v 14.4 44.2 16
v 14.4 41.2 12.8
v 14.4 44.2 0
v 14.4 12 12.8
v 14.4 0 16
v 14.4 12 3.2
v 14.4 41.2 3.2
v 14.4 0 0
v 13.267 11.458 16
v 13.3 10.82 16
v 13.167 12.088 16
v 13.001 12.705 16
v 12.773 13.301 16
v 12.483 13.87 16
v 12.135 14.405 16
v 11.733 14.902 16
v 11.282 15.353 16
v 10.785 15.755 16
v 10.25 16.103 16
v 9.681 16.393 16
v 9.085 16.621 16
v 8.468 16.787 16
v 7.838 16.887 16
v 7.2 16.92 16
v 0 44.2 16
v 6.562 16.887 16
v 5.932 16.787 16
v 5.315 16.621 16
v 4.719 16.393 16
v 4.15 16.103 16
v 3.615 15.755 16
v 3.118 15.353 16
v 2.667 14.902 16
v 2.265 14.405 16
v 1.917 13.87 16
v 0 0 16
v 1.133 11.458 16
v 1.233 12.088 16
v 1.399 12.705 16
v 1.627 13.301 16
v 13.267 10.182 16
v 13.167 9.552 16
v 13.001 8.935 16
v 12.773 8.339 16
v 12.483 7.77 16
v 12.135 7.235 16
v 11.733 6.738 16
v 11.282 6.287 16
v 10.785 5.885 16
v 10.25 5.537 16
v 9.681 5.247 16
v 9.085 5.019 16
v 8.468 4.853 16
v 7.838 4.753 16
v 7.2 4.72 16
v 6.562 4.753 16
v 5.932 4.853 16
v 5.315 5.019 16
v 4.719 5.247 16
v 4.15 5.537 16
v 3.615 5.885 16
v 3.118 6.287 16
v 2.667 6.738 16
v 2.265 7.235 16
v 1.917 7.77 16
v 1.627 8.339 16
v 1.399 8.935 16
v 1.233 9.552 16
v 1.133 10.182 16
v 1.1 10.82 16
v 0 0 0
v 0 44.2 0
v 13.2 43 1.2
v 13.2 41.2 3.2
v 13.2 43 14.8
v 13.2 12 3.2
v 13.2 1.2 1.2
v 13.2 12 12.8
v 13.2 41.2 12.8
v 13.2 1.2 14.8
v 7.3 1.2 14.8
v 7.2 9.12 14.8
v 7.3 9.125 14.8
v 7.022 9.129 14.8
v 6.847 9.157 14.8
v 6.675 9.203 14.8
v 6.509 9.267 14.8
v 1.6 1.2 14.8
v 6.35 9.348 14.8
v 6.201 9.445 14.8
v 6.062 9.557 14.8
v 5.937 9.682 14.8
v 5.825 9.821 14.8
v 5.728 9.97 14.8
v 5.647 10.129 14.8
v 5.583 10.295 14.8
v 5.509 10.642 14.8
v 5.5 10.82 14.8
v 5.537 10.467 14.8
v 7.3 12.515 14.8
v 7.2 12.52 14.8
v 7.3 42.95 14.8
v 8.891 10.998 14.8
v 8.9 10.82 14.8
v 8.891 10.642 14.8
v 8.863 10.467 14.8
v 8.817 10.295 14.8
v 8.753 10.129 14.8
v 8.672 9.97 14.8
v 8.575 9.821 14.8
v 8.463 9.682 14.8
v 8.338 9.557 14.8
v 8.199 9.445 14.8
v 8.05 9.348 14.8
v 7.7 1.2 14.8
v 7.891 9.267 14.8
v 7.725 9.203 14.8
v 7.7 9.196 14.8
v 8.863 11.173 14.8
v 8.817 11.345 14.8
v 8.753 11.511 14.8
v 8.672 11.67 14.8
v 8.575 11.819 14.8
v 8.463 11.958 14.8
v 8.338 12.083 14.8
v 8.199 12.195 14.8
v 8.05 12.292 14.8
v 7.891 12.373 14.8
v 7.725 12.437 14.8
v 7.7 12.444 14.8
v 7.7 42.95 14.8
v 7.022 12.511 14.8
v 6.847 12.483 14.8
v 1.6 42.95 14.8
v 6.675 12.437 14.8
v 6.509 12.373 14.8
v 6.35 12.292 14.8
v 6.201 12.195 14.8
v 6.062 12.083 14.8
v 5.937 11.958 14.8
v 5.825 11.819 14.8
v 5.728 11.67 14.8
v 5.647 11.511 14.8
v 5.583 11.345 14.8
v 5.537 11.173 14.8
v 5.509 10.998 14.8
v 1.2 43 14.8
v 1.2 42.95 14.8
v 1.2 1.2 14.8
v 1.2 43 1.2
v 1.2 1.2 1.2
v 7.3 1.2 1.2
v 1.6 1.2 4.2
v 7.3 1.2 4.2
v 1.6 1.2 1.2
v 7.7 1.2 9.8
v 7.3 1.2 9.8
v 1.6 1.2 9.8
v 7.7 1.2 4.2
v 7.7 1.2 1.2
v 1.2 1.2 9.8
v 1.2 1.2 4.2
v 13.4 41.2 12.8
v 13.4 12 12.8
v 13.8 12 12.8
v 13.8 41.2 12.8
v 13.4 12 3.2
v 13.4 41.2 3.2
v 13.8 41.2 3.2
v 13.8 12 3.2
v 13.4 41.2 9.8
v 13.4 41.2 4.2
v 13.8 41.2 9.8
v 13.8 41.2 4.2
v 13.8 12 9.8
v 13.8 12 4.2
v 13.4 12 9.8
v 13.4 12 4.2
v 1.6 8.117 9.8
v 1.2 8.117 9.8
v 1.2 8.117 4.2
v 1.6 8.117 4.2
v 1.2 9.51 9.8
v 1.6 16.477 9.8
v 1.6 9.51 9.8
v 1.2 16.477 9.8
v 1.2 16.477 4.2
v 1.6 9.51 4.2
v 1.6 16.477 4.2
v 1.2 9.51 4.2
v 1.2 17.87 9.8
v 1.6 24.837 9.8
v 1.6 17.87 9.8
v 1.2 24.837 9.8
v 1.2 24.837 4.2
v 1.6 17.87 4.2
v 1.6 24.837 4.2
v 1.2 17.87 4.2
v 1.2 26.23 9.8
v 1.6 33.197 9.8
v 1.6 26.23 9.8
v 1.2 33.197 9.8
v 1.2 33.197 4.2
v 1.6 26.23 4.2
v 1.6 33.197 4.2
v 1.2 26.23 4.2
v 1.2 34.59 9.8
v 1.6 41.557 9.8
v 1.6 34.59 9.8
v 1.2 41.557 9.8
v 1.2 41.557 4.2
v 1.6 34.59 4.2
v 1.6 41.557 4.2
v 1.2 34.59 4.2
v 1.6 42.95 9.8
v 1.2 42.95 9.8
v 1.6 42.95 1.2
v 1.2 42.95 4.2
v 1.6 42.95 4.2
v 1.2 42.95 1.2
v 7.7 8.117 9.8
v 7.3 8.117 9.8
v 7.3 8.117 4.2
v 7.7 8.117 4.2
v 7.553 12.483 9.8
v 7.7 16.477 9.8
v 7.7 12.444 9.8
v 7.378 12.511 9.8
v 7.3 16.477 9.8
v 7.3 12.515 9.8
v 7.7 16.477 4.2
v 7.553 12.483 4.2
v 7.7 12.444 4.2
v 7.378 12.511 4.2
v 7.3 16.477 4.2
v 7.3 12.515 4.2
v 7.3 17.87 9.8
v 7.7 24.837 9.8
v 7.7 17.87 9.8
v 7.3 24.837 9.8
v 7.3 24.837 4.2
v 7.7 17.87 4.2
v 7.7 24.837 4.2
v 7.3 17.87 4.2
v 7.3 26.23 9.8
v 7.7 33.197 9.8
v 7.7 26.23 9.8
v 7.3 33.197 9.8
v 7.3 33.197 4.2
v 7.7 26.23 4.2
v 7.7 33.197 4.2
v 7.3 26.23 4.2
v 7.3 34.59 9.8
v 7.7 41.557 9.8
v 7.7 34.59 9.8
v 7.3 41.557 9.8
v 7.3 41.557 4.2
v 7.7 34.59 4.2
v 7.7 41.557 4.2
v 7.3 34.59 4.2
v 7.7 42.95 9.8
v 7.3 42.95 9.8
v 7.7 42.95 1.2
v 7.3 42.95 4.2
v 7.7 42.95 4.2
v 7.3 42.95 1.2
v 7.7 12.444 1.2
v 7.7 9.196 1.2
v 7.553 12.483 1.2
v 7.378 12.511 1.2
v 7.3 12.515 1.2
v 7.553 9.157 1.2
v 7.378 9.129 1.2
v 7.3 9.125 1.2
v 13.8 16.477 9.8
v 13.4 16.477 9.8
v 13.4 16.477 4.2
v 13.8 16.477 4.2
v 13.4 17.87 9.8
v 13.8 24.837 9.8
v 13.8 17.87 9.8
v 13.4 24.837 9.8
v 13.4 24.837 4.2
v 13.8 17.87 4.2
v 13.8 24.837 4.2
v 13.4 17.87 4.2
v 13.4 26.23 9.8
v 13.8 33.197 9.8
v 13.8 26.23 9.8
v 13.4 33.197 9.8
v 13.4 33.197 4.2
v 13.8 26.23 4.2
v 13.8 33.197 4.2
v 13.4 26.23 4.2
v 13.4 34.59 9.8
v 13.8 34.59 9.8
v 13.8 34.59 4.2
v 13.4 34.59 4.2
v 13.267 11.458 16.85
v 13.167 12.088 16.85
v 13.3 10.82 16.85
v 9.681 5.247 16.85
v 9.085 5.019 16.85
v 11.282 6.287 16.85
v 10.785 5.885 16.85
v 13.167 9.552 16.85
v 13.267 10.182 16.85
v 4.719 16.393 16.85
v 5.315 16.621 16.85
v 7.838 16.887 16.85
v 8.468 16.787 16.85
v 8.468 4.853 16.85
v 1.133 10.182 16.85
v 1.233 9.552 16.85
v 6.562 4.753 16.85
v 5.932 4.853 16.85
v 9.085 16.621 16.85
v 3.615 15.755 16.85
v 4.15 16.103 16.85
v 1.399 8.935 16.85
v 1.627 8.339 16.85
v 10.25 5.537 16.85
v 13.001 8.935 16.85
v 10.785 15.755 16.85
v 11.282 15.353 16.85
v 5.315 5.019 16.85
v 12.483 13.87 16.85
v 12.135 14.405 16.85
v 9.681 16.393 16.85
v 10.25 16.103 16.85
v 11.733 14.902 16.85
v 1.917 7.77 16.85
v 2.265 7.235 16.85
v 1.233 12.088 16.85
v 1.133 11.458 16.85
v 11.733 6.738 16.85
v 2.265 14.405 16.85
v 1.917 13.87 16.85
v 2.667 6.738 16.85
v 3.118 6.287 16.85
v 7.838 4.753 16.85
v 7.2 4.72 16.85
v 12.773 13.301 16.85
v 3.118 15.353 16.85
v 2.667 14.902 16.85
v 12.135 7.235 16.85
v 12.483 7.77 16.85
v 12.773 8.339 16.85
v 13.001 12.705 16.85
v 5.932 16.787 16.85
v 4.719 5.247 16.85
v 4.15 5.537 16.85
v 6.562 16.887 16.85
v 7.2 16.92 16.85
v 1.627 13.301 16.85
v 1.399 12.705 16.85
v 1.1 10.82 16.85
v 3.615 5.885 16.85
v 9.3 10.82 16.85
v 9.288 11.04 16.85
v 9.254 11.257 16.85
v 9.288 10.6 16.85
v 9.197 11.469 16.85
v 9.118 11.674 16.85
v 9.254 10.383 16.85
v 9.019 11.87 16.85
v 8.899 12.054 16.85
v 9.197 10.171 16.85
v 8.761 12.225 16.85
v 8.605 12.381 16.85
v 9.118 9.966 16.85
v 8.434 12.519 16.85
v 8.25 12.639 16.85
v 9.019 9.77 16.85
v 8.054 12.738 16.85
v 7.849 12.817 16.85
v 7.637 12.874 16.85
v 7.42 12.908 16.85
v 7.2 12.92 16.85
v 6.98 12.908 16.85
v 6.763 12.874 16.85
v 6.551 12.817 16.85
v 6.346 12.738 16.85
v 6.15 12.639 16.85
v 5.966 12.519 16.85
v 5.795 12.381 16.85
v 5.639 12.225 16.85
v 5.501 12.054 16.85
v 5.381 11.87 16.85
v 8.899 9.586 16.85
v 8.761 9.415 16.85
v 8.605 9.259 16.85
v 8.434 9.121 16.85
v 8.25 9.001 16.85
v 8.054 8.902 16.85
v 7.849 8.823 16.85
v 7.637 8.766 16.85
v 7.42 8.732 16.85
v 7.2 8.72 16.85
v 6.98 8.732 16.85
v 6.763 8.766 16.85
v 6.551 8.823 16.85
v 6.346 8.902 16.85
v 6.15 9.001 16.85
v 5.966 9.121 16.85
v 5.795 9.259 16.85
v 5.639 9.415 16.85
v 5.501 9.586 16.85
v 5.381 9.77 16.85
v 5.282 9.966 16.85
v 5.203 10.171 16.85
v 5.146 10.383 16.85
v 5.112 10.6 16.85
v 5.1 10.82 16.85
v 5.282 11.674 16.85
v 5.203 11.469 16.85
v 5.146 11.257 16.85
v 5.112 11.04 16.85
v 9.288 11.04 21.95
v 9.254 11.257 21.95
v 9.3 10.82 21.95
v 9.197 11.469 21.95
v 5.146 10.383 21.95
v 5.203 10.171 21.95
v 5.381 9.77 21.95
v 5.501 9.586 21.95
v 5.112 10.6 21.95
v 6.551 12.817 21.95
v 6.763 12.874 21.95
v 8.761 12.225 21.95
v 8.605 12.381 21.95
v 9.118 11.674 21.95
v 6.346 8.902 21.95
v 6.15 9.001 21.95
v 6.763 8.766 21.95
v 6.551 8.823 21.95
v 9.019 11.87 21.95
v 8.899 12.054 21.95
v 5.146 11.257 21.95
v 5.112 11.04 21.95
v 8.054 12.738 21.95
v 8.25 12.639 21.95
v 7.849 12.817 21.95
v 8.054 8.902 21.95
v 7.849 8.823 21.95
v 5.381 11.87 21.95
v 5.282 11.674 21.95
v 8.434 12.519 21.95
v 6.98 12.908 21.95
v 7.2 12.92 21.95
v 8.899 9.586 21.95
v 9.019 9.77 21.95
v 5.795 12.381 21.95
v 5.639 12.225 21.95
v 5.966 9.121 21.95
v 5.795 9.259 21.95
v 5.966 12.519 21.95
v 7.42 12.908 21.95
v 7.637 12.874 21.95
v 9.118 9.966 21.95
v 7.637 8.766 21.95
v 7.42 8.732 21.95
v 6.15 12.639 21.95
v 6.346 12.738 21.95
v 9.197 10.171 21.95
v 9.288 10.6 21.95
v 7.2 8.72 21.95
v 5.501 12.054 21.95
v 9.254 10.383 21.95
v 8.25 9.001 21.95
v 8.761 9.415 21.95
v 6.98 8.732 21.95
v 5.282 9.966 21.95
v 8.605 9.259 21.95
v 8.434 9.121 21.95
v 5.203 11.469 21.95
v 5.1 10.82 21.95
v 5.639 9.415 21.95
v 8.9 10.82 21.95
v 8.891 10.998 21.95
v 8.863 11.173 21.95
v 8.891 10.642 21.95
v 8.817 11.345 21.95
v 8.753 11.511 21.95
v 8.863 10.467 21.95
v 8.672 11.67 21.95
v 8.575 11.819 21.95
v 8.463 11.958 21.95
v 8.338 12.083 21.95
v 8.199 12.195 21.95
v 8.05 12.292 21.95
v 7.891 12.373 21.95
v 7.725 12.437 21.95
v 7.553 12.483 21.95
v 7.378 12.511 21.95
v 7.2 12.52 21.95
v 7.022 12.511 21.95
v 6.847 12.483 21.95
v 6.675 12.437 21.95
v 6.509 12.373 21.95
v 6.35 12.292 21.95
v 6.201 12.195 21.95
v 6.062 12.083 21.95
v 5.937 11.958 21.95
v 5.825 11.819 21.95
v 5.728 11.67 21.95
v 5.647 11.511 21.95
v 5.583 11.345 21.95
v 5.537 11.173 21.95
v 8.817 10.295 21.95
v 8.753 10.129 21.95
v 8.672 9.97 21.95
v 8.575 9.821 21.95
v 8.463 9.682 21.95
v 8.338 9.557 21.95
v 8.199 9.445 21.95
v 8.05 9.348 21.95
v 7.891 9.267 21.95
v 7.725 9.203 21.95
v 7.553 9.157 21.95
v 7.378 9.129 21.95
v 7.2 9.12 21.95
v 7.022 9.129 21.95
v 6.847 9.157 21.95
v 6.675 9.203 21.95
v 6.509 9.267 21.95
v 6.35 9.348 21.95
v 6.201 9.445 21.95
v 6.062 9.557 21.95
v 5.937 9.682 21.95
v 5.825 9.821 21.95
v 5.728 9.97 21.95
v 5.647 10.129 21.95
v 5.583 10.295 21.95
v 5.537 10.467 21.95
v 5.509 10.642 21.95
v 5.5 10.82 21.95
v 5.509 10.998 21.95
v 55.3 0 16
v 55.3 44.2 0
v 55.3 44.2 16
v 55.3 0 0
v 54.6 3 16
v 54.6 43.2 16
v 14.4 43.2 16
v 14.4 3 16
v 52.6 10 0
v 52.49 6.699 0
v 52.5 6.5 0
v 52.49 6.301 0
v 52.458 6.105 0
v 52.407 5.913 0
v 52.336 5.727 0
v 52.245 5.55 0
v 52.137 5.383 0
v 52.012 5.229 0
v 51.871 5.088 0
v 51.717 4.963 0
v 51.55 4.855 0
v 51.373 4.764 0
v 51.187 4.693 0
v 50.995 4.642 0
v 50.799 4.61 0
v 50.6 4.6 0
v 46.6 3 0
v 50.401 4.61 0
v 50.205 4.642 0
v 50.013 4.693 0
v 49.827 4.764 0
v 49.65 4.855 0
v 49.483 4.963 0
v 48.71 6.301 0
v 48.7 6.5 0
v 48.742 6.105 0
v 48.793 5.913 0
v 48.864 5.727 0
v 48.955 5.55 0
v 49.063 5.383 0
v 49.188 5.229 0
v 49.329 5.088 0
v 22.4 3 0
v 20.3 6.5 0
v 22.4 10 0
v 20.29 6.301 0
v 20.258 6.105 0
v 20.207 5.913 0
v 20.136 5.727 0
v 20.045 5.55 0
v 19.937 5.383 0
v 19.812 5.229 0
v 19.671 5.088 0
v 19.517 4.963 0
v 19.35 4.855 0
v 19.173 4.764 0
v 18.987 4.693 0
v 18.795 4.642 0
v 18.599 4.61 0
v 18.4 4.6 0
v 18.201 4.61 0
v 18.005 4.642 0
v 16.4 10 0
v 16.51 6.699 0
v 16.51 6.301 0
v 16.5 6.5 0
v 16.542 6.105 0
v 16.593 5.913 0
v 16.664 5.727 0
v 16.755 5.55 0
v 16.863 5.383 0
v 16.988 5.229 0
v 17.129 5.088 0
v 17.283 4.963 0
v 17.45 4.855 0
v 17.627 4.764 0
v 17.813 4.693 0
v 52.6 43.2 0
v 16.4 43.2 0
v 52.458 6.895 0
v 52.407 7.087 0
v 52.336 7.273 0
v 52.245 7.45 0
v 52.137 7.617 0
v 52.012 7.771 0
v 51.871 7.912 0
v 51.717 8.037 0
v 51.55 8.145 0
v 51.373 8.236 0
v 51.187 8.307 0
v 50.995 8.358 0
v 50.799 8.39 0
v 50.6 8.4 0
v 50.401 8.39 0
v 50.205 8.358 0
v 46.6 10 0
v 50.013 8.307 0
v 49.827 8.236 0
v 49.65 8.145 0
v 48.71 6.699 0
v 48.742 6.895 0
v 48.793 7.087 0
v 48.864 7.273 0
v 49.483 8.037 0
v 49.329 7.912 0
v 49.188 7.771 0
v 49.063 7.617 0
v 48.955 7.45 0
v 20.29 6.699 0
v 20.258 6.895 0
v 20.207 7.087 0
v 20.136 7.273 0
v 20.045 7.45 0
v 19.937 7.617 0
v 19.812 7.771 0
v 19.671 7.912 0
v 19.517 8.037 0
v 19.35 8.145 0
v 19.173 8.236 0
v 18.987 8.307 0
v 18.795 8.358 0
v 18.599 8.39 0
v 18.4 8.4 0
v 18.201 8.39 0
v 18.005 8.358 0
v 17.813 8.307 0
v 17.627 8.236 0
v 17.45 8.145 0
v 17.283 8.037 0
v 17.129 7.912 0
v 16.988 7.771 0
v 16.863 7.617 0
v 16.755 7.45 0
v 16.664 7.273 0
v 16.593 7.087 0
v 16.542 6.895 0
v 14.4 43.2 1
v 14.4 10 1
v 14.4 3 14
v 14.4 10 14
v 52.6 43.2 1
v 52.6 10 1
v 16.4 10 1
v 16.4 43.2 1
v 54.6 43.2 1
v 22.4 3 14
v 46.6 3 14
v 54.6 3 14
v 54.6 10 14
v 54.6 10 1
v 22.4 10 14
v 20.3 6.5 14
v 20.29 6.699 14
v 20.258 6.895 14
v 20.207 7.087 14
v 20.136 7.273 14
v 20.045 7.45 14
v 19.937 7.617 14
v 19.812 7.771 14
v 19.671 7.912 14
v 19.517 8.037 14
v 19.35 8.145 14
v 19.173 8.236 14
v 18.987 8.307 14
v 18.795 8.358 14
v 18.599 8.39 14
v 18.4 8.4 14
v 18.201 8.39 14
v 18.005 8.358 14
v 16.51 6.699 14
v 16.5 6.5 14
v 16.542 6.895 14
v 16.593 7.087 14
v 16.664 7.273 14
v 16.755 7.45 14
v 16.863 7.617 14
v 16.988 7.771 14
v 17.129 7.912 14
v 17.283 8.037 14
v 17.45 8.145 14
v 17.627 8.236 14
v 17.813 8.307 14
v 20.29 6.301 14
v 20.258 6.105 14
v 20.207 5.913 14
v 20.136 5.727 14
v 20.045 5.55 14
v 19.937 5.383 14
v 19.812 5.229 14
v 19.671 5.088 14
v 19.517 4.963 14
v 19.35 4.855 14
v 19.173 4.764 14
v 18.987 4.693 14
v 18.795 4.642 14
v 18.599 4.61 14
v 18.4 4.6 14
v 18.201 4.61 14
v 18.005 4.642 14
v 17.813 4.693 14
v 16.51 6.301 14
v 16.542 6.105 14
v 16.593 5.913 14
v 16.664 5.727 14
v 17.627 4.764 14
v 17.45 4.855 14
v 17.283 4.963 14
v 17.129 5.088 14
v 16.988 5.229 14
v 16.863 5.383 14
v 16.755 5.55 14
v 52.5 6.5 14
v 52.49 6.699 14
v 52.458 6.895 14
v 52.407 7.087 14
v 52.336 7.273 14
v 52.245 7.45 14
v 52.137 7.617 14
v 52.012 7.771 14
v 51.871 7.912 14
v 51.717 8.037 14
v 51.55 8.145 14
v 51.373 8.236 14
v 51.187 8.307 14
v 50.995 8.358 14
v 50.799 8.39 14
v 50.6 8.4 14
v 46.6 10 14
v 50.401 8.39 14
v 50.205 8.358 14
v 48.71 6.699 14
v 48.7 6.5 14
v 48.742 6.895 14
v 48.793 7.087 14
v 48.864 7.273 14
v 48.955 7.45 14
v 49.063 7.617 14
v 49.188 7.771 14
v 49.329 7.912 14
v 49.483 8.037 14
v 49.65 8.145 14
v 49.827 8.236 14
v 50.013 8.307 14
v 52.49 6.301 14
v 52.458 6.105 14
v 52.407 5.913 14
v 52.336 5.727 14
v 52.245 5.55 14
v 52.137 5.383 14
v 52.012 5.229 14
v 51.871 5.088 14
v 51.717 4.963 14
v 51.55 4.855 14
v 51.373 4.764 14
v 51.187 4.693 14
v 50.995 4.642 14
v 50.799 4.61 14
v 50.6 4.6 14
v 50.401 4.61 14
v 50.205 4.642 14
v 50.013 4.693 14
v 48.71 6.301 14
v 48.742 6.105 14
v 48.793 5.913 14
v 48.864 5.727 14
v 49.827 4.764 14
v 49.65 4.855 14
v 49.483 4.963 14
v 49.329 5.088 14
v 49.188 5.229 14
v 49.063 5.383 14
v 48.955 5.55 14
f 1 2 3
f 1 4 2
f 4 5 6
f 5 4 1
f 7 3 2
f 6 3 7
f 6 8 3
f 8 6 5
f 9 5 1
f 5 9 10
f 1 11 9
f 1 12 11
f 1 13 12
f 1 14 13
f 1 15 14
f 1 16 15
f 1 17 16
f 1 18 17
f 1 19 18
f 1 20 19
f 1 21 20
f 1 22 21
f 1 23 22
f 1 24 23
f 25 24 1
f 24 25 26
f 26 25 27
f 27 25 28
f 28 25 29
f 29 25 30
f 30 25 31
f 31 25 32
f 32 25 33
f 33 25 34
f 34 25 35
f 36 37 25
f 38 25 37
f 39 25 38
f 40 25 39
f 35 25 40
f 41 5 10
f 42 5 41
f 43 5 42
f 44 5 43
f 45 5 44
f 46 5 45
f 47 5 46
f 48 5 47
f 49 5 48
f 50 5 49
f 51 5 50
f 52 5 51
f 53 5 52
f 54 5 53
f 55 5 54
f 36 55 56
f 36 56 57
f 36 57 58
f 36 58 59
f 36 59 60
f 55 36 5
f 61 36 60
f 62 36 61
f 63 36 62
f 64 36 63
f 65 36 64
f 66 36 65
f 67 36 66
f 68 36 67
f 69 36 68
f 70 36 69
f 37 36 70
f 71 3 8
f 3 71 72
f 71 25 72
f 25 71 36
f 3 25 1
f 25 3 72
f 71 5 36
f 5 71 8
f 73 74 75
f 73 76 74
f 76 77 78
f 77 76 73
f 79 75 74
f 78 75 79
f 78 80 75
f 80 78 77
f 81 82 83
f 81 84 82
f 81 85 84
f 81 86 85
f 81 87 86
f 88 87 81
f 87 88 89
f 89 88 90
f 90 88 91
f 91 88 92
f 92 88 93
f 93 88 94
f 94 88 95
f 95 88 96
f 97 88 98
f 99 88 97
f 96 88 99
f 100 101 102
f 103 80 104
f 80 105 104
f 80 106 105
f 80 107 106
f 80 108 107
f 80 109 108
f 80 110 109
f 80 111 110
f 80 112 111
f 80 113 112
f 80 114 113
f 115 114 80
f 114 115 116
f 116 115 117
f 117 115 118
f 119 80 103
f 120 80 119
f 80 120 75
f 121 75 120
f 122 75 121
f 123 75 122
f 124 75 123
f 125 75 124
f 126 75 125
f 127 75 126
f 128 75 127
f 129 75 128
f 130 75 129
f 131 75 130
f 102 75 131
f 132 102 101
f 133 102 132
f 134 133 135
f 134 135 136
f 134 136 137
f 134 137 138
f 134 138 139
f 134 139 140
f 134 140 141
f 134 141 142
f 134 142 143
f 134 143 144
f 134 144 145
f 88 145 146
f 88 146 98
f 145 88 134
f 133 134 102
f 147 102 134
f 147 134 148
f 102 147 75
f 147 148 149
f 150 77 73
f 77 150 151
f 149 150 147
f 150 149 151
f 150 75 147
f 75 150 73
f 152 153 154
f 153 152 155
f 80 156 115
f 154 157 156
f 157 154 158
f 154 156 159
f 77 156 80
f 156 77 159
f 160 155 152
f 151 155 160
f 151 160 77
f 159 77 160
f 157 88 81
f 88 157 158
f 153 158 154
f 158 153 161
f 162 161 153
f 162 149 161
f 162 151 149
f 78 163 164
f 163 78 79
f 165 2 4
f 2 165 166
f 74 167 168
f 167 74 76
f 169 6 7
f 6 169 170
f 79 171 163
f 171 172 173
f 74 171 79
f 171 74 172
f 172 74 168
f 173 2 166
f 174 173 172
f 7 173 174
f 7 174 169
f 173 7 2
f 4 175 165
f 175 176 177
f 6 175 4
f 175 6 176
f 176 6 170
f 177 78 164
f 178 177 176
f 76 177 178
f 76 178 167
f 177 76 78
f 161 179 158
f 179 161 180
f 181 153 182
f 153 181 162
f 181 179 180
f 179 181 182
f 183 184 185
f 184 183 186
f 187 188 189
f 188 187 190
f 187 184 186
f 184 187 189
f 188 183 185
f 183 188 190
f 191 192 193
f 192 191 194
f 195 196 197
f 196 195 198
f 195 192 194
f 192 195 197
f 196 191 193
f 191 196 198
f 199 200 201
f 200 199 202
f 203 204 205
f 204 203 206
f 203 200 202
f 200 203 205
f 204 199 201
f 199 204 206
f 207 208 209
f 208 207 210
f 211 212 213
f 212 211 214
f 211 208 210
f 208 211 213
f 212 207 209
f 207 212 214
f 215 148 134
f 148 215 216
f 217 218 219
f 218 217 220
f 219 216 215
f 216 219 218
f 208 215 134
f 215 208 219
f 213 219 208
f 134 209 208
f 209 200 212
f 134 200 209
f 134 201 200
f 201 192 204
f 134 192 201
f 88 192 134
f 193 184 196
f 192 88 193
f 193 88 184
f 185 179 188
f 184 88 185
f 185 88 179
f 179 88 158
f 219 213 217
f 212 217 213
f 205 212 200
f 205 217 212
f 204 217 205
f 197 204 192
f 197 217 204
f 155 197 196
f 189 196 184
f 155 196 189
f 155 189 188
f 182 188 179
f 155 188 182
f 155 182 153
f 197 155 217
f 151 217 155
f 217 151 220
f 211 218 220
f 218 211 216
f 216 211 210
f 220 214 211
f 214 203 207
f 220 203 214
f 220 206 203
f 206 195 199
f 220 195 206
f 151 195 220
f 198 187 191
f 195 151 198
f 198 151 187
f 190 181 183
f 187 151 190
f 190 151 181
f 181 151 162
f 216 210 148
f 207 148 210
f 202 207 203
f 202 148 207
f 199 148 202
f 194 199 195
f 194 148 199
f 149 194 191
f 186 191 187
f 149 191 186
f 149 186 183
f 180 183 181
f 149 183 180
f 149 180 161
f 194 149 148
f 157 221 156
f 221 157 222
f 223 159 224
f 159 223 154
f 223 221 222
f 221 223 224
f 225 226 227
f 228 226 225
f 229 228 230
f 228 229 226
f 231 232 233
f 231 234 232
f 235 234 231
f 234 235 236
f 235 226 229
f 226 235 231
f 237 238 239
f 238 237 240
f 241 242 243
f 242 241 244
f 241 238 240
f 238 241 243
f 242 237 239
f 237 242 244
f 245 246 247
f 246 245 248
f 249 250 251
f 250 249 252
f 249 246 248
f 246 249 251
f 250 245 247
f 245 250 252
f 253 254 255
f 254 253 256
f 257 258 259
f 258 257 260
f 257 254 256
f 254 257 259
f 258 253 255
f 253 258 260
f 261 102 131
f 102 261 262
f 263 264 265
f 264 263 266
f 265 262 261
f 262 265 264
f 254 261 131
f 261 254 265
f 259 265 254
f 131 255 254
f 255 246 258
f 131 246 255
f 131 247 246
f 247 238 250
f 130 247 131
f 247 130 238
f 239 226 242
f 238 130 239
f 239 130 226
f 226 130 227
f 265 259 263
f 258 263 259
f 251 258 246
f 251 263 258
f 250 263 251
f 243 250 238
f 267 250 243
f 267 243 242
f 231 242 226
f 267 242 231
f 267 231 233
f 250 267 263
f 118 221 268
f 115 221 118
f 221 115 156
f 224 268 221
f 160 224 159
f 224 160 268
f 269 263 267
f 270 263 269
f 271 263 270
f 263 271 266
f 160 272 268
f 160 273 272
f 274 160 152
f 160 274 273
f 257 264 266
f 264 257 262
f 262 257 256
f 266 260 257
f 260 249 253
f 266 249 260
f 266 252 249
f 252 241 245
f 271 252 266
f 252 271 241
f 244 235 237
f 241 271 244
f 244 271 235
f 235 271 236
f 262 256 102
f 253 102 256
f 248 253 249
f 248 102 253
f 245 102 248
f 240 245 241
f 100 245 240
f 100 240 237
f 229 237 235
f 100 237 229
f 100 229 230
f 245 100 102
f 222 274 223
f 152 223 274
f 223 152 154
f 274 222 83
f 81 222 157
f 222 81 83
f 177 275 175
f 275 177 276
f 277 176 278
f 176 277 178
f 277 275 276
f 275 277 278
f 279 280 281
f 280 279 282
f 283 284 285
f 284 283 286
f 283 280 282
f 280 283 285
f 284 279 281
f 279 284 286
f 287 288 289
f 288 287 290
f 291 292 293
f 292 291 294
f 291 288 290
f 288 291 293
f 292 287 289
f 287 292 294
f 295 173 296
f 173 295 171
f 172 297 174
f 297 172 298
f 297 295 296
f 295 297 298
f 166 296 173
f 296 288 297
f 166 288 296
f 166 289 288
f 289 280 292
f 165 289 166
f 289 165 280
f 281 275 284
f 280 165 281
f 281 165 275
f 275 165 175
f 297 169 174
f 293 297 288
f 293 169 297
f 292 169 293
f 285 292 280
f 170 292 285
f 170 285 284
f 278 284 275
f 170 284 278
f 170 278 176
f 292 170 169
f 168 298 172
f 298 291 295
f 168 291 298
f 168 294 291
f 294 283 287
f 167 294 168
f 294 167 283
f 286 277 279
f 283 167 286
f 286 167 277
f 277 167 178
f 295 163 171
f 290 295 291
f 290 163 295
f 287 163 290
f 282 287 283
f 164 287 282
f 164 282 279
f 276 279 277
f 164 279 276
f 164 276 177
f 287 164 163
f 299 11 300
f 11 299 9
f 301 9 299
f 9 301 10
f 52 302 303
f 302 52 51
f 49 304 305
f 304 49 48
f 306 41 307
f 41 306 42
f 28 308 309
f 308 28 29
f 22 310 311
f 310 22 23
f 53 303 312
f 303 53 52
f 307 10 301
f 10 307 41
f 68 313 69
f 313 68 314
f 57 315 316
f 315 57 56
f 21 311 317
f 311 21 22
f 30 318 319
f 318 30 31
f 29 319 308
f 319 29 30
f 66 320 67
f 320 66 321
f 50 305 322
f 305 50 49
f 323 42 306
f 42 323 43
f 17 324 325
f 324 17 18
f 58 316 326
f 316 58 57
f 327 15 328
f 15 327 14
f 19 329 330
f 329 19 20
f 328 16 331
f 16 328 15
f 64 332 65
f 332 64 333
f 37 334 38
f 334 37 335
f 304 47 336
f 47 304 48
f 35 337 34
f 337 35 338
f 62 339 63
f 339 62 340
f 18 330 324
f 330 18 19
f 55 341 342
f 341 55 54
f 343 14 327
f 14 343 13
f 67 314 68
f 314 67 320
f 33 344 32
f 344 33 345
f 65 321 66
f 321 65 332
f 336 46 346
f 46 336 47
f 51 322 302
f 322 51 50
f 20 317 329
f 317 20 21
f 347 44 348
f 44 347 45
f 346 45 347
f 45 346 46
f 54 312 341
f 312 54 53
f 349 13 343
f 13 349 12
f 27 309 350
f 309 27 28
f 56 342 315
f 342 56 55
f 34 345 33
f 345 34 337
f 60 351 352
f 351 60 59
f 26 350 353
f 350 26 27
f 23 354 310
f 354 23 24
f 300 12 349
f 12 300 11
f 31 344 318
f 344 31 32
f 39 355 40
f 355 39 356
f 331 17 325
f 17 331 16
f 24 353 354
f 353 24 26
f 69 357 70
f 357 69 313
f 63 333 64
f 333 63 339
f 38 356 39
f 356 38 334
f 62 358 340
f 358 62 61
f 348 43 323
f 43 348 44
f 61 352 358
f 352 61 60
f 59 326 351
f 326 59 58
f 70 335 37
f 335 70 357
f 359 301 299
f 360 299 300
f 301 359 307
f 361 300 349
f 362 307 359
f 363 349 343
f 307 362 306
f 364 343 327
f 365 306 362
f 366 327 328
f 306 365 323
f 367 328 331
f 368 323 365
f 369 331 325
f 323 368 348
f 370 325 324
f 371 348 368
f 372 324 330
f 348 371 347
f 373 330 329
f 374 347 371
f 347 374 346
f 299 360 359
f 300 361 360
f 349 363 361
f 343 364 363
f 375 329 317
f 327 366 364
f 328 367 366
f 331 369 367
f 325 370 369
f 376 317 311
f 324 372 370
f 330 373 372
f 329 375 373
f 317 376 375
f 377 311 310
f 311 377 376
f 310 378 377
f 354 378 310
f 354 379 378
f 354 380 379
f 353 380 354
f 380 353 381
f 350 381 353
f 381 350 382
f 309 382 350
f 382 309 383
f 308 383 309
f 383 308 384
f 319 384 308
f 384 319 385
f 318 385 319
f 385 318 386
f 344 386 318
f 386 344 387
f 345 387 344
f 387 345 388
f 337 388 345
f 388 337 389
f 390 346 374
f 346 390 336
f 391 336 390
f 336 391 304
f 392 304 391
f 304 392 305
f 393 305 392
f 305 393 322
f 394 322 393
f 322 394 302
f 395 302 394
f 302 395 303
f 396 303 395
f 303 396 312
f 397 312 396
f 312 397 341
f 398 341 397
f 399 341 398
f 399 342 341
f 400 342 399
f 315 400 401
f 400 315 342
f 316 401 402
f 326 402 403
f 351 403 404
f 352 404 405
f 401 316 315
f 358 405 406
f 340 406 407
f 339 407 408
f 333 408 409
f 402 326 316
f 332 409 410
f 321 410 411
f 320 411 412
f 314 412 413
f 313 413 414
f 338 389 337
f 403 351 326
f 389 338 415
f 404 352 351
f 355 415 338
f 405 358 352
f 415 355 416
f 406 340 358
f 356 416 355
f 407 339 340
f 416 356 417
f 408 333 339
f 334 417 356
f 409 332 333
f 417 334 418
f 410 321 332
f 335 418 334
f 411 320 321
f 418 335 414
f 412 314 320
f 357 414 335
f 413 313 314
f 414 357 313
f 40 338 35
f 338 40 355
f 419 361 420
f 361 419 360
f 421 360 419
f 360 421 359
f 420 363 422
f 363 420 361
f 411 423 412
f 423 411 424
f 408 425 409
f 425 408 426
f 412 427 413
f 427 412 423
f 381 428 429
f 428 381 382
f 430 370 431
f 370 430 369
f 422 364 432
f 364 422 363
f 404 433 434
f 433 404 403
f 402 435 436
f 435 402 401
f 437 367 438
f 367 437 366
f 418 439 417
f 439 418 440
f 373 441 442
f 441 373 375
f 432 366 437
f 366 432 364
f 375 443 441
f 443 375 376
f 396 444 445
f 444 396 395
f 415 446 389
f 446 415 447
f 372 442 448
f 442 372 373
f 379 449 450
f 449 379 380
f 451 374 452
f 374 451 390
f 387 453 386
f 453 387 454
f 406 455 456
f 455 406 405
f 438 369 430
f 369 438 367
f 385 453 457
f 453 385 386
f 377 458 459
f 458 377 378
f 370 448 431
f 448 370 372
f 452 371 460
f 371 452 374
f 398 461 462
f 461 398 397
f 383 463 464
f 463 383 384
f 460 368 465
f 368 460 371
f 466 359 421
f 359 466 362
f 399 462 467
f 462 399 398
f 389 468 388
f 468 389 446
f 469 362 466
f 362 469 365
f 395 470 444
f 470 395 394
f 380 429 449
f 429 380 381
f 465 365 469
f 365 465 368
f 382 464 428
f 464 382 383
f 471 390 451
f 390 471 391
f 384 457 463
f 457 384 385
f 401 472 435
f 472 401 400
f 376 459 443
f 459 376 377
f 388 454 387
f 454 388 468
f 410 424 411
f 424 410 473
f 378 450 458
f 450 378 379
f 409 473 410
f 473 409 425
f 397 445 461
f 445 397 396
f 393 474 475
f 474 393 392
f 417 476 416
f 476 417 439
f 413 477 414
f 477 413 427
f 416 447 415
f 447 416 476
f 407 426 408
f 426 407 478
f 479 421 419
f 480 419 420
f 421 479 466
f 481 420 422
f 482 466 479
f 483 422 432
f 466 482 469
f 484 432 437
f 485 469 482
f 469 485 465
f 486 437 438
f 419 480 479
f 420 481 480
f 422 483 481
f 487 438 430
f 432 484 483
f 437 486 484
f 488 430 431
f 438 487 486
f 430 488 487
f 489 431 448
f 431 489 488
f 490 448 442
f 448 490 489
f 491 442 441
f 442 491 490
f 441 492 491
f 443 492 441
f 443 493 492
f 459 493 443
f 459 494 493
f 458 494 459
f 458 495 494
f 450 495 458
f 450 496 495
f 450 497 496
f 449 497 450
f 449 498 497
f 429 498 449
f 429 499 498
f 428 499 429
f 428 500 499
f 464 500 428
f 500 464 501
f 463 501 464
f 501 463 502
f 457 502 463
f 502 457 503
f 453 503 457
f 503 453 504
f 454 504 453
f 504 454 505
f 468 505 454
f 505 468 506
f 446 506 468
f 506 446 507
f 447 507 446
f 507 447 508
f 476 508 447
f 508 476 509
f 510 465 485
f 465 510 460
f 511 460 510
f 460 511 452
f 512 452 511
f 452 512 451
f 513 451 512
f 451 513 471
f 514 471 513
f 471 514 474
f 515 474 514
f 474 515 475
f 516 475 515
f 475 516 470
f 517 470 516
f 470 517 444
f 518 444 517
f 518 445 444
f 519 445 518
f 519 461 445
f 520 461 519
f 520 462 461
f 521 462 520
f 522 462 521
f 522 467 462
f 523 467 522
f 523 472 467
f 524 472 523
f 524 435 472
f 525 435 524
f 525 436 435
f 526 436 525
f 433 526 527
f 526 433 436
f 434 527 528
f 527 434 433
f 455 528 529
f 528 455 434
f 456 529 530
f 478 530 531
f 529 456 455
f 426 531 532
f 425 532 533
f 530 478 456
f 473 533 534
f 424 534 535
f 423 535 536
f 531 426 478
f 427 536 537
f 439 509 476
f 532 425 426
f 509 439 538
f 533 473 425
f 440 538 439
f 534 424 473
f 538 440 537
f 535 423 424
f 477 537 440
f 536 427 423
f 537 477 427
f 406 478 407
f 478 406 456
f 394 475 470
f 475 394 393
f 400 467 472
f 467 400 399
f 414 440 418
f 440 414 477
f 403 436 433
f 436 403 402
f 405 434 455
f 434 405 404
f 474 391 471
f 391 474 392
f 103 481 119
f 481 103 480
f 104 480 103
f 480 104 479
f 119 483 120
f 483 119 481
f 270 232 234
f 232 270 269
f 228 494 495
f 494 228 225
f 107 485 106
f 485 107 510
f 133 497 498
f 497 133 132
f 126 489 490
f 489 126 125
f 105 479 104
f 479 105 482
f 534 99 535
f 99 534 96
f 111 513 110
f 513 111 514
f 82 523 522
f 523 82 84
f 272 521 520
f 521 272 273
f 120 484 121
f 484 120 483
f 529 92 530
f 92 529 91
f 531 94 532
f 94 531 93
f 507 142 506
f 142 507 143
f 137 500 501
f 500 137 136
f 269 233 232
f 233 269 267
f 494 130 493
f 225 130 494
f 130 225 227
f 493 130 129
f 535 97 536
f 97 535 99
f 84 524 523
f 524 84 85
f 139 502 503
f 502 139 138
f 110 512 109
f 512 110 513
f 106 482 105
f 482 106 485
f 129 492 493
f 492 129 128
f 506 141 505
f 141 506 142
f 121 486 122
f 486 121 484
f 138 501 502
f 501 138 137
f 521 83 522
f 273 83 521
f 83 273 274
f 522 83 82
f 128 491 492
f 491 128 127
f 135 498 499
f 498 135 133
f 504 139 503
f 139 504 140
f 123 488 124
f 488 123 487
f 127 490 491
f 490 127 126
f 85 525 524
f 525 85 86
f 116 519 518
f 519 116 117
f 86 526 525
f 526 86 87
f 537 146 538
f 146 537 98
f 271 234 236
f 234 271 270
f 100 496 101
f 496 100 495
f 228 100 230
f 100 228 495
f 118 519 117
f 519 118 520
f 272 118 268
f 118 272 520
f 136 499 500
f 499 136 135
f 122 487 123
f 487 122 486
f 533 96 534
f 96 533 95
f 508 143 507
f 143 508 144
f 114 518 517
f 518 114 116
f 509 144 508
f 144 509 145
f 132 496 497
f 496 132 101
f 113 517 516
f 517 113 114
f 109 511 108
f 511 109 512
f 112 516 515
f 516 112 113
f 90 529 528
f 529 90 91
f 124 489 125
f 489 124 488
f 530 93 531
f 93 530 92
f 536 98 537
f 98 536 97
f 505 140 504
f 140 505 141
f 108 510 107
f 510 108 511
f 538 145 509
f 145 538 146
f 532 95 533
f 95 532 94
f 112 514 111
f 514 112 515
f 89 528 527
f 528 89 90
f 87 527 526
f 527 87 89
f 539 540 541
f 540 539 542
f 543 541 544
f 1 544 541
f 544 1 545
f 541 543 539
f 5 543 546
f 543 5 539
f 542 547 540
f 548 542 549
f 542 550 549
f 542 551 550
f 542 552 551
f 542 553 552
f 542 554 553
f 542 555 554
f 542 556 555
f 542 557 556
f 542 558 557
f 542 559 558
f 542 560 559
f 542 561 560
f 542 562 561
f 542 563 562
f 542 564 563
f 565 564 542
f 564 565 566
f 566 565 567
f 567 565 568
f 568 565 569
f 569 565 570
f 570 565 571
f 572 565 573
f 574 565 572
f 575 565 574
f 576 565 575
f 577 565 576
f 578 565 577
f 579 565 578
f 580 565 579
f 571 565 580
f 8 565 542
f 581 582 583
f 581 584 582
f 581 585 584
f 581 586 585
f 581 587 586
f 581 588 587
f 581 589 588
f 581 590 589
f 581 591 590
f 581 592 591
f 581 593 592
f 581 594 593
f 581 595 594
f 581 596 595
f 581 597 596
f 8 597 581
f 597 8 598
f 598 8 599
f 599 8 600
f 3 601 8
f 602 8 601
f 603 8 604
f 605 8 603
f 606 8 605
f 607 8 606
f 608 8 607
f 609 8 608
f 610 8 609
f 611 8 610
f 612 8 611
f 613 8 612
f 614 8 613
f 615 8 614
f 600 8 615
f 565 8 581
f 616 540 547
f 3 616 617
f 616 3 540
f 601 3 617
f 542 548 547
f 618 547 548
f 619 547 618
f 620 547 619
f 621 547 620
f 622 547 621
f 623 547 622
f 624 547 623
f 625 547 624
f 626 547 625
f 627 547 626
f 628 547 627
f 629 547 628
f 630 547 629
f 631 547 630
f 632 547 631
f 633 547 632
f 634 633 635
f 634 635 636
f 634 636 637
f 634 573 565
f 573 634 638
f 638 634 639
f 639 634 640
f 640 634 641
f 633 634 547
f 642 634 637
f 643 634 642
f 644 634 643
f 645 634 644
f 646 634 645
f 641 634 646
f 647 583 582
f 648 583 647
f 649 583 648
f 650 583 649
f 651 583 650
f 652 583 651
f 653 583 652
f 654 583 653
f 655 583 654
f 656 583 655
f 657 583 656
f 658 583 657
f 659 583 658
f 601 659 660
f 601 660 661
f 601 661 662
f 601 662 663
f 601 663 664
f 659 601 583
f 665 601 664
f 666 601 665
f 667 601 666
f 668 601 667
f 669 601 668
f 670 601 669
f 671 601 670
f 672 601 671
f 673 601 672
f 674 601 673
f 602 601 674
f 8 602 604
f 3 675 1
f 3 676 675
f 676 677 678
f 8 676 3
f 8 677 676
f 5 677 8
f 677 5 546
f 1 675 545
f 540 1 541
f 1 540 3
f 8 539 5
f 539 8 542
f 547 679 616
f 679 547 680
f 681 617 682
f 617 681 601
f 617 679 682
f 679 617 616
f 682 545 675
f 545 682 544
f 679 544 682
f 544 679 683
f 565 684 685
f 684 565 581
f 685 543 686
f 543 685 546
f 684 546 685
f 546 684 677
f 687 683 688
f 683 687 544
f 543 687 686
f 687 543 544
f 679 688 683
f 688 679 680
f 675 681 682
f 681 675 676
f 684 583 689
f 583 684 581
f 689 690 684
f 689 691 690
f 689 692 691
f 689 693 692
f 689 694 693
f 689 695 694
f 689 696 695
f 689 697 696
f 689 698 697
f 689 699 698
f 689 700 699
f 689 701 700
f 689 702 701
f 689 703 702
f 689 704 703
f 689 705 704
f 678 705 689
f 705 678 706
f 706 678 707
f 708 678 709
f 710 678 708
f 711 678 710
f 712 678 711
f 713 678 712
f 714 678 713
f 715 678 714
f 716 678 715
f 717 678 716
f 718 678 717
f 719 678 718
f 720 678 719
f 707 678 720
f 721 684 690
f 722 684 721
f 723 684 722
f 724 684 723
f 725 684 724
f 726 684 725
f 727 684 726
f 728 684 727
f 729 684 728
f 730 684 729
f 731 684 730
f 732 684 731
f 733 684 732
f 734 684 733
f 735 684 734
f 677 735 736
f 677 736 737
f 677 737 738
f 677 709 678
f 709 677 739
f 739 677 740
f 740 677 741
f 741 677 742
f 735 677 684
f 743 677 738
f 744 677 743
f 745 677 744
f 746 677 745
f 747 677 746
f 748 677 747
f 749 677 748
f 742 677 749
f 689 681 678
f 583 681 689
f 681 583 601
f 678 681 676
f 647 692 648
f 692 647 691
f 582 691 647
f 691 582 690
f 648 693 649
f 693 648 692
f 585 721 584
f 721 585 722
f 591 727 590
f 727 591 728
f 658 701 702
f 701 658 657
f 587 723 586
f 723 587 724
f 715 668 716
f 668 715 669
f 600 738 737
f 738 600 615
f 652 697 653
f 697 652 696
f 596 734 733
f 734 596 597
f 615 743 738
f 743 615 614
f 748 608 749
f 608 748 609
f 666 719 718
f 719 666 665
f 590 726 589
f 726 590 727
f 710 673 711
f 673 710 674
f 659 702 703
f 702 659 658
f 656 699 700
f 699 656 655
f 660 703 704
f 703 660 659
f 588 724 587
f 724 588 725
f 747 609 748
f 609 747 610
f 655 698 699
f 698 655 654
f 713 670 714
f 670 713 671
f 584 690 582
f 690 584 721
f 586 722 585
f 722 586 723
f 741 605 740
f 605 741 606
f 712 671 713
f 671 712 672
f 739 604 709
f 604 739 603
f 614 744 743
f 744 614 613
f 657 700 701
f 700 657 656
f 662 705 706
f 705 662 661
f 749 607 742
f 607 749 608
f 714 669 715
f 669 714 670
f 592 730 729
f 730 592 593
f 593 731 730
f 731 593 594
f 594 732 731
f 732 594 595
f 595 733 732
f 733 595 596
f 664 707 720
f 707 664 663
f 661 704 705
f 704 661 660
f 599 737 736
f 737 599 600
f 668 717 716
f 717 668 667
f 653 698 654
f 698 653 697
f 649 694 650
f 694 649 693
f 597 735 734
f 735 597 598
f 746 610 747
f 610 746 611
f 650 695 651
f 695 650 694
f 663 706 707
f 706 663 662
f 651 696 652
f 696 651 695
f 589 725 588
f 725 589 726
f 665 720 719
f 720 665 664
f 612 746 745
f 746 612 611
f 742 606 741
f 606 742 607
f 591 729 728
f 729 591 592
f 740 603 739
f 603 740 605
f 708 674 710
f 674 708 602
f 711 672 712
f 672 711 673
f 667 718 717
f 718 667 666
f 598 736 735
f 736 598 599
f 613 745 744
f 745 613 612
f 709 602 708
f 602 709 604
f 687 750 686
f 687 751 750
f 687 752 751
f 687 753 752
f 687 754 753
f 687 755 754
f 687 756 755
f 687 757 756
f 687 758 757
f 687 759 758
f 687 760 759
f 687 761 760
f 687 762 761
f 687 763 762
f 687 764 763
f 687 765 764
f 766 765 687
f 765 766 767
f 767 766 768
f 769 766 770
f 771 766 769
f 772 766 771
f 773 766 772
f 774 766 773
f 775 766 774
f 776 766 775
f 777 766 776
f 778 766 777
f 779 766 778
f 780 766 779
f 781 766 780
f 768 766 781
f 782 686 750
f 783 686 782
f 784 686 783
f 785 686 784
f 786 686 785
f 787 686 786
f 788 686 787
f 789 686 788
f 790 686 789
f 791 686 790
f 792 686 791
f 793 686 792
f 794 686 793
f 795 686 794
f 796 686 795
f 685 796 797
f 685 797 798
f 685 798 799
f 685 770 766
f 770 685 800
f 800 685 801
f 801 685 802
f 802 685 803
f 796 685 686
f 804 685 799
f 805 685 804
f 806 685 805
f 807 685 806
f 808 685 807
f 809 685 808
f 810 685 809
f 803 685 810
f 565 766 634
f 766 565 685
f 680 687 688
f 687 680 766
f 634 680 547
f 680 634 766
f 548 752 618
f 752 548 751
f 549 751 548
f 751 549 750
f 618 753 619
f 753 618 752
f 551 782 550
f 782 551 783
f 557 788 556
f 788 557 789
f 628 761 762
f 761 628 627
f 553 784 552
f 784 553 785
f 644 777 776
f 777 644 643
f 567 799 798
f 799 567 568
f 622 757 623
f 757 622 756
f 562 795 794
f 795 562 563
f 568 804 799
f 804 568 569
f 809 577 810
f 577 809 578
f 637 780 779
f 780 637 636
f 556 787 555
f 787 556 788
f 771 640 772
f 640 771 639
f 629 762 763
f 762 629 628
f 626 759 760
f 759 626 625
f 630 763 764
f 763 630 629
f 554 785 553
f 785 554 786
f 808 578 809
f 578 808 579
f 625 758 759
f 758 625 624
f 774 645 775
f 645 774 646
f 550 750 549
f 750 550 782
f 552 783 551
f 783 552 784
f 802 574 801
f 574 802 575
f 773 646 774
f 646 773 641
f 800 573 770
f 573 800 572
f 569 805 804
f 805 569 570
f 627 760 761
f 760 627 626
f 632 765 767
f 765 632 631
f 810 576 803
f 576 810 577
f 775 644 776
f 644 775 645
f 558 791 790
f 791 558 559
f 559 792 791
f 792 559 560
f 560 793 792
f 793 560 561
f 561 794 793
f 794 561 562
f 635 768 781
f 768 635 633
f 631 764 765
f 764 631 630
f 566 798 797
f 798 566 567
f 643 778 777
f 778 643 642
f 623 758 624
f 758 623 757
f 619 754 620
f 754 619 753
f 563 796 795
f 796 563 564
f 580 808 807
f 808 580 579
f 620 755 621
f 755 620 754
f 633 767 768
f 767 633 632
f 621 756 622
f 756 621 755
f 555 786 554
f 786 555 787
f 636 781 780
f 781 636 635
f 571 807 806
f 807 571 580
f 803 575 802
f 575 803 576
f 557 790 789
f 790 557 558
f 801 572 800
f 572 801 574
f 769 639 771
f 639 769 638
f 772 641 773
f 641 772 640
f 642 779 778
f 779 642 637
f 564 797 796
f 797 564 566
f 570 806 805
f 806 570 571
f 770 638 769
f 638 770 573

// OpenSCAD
// MK8 air cage, for Prusa i3 Pro B. traps air from extruder feeder cooler, routes to pipe end, where an air nozzle
// can be connected to.
//
// 2016Sep13, ls  (http://www.thingiverse.com/Bushmills)
//	v0.0.1   initial version
//	v0.0.2   support changed to interleaved pillars 
// 2016Sep14, ls
//	v0.0.3   support changed to perforated walls. lowered blocks. thicker walls around air chamber.
//               gave pipe end foundation more substance.
// 2016Sep15, ls
//	v0.0.4   added foundation to pipe end to avoid sagging
// 2016Sep19, ls
//	v0.0.5   eliminated "pillars_" from air chamber variable names, changing to "wall_" 
//	         own variable for pipe end wall thickness. rather than reusing air chamber wall thickness. 
//	         slicing may benefit from slic3r --spiral-vase option.

$fn=60;
// show object inside at percentage depth
explode=0;			// [0:100]

// *********************************************************
/* main frame setting */

// adjustable in very small steps, because this determines the degree of leakyness 
cooler_width=40.2;		// [32:0.1:64]

// adjustable in very small steps, because this determines the degree of leakyness 
cooler_height=40.2;		// [32:0.1:64]

// overall depth of item, excluding pipe end
depth=16;			// [10:0.1:32]

// how far does extruder side retainment protrude into cooler
brim=2;                         // [0:0.1:10]

// how thick is extruder side retainment
brim_strength=1;			// [0.4:0.1:5]

// thickness of frame opposite of air chamber 
far_wall=0.7;			// [0.4:0.1:5]

// thickness of frame on side of holding blocks 
base=3;				// [0.4:0.1:10]

// thickness of opposite side  
roof_wall=1;			// [0.4:0.1:5]

height=base+cooler_height+roof_wall;


// *************************************************
/* mounting blocks */

block_height=7;			// [2:0.1:20]

// affects hole distance, which is (cooler_width - block_width) as holes are block centered 
block_width=8;			// [2:0.1:20]

// bore diameter for screws
mount_hole=3.8;			// [2:0.1:8]

// fan immersion shortens blocks on fan side, allowing fan to penetrate air cage, reducing leakage.
fan_immersion=1;		// [0:0.1:8]


// ***********************
/* air chamber settings */

// thickness of walls surrounding air chamber, and pipe and wall strength
air_chamber_wall=1.2;		// [0.1:0.1:8]

// "chamber" refers to dimensions of hollow space inside
air_chamber_width=12;		// [4:1:32]

// brim around air passage
air_passage_brim=2;		// [0:0.1:8]

airpassage_length=cooler_height-block_height-2*air_passage_brim;

width=far_wall+cooler_width+air_chamber_width+2*air_chamber_wall;

air_chamber_height=height-2*air_chamber_wall;
air_chamber_depth=depth-2*air_chamber_wall;
air_chamber_x=far_wall+cooler_width+air_chamber_wall;
air_chamber_y=air_chamber_wall+0;

// support for pipe end sided roof. distance means "maximum distance", as actual distance will be calculated
wall_distance=8;		// [1:0.1:24]

// thickness of air chamber walls, seperating lanes
wall_strength=0.4;		// [0.2:0.1:2]

// **********************************************
/* pipe end */

pipe_end_foundation_length=1;	// [0:0.1:8]
pipe_end_foundation_foot=4; 	// [0:0.1:8]
pipe_end_length=5;		// [0:0.1:16]

// outer diameter
pipe_end_diameter=4.2;		// [1:0.1:8]
pipe_end_wall=0.4;		// [0.2:0.1:4]
pipe_end_elevation_percent=20;	// [0:100]

pipe_end_radius=pipe_end_diameter/2;
pipe_end_x=air_chamber_width/2+air_chamber_wall;
pipe_end_y=air_chamber_wall+pipe_end_radius;
little=0.1+0;


// ************************************************************

lanes=ceil((air_chamber_width-wall_strength)/wall_distance);
lanes_spacing=(air_chamber_width+air_chamber_wall/(lanes+1)-wall_strength/2)/lanes;

module wall()  {
	difference()  {
		cube([wall_strength, air_chamber_height, air_chamber_depth]);

		for (i=[0:5])   {
		translate([-little/2, i*air_chamber_height/5, 3])
		cube([wall_strength+little, air_chamber_height/6, air_chamber_depth-8]);
		}
	}
}

module support()  {
	for (lane=[0:lanes])  {
		translate([lane*lanes_spacing+air_chamber_wall, air_chamber_wall-little/2, air_chamber_wall])
		wall();
	}
}


module pipe_end_bore()  {
	cylinder(depth+pipe_end_length-air_chamber_wall+pipe_end_foundation_length+little/2,
	pipe_end_radius-pipe_end_wall,
	pipe_end_radius-pipe_end_wall);
}

module pipe_end()  {
	translate([0, 0, -little])
	cylinder(pipe_end_foundation_length,
	         pipe_end_radius+pipe_end_foundation_foot,
                 pipe_end_radius+pipe_end_foundation_foot);

	cylinder(pipe_end_length+pipe_end_foundation_length,				// pipe
		pipe_end_radius,
		pipe_end_radius);

}

module air_chamber()  {
	difference()  {
		union()  {
		        difference()  {
				cube([air_chamber_width+2*air_chamber_wall, height, depth]);			// air chamber enclosure

				translate([air_chamber_wall, air_chamber_wall, air_chamber_wall])		// carve out air chamber
				cube([air_chamber_width, air_chamber_height, air_chamber_depth]);		

				translate([air_chamber_wall+air_chamber_width-little/2,				// air passage opening
				           base+block_height+air_passage_brim,
				           air_chamber_wall+air_passage_brim])
				cube([air_chamber_wall+little,
				      airpassage_length,
				      air_chamber_depth-2*air_passage_brim]);
			}

			support();

			translate([pipe_end_x,
				pipe_end_y+(air_chamber_height-pipe_end_diameter)*pipe_end_elevation_percent/100,
				depth-little/2])
			pipe_end();

		}

		translate([pipe_end_x,
		           pipe_end_y+(air_chamber_height-pipe_end_diameter)*pipe_end_elevation_percent/100,
	        	   air_chamber_wall])
		pipe_end_bore();
	}
}




module block(width, height, depth, dia)  {
	difference()  {
		cube([width, height, depth-fan_immersion]);

		translate([width/2, height/2, -little/2])
		cylinder(depth+little, dia/2, dia/2);
	}
}

module cooler_frame()  {

	difference()  {

		cube([cooler_width+far_wall, height, depth]);			// base block

		translate([brim, base, -little/2])			// bottom (extruder-faced) opening
		cube([cooler_width-2*brim, cooler_height, brim_strength+little]);

		translate([-little/2, base, brim_strength])		// cooler containment
		cube([cooler_width+little/2, cooler_height, depth-brim_strength+little]);
	}

	for (x=[0:1])
	translate([x*(cooler_width-block_width), base, 0])
	block(block_width, block_height, depth-fan_immersion, mount_hole);	// fan mount block 
}


module air_cage()  {
	air_chamber();

	translate([air_chamber_width+air_chamber_wall*2, 0, 0])
	cooler_frame();
}


difference()  {
	air_cage();

	if(explode)
	translate([0-little/2, 0-little/2, depth*explode/100])
	cube([width+little, height+little, depth*(100-explode)/100+little/2]);
}
